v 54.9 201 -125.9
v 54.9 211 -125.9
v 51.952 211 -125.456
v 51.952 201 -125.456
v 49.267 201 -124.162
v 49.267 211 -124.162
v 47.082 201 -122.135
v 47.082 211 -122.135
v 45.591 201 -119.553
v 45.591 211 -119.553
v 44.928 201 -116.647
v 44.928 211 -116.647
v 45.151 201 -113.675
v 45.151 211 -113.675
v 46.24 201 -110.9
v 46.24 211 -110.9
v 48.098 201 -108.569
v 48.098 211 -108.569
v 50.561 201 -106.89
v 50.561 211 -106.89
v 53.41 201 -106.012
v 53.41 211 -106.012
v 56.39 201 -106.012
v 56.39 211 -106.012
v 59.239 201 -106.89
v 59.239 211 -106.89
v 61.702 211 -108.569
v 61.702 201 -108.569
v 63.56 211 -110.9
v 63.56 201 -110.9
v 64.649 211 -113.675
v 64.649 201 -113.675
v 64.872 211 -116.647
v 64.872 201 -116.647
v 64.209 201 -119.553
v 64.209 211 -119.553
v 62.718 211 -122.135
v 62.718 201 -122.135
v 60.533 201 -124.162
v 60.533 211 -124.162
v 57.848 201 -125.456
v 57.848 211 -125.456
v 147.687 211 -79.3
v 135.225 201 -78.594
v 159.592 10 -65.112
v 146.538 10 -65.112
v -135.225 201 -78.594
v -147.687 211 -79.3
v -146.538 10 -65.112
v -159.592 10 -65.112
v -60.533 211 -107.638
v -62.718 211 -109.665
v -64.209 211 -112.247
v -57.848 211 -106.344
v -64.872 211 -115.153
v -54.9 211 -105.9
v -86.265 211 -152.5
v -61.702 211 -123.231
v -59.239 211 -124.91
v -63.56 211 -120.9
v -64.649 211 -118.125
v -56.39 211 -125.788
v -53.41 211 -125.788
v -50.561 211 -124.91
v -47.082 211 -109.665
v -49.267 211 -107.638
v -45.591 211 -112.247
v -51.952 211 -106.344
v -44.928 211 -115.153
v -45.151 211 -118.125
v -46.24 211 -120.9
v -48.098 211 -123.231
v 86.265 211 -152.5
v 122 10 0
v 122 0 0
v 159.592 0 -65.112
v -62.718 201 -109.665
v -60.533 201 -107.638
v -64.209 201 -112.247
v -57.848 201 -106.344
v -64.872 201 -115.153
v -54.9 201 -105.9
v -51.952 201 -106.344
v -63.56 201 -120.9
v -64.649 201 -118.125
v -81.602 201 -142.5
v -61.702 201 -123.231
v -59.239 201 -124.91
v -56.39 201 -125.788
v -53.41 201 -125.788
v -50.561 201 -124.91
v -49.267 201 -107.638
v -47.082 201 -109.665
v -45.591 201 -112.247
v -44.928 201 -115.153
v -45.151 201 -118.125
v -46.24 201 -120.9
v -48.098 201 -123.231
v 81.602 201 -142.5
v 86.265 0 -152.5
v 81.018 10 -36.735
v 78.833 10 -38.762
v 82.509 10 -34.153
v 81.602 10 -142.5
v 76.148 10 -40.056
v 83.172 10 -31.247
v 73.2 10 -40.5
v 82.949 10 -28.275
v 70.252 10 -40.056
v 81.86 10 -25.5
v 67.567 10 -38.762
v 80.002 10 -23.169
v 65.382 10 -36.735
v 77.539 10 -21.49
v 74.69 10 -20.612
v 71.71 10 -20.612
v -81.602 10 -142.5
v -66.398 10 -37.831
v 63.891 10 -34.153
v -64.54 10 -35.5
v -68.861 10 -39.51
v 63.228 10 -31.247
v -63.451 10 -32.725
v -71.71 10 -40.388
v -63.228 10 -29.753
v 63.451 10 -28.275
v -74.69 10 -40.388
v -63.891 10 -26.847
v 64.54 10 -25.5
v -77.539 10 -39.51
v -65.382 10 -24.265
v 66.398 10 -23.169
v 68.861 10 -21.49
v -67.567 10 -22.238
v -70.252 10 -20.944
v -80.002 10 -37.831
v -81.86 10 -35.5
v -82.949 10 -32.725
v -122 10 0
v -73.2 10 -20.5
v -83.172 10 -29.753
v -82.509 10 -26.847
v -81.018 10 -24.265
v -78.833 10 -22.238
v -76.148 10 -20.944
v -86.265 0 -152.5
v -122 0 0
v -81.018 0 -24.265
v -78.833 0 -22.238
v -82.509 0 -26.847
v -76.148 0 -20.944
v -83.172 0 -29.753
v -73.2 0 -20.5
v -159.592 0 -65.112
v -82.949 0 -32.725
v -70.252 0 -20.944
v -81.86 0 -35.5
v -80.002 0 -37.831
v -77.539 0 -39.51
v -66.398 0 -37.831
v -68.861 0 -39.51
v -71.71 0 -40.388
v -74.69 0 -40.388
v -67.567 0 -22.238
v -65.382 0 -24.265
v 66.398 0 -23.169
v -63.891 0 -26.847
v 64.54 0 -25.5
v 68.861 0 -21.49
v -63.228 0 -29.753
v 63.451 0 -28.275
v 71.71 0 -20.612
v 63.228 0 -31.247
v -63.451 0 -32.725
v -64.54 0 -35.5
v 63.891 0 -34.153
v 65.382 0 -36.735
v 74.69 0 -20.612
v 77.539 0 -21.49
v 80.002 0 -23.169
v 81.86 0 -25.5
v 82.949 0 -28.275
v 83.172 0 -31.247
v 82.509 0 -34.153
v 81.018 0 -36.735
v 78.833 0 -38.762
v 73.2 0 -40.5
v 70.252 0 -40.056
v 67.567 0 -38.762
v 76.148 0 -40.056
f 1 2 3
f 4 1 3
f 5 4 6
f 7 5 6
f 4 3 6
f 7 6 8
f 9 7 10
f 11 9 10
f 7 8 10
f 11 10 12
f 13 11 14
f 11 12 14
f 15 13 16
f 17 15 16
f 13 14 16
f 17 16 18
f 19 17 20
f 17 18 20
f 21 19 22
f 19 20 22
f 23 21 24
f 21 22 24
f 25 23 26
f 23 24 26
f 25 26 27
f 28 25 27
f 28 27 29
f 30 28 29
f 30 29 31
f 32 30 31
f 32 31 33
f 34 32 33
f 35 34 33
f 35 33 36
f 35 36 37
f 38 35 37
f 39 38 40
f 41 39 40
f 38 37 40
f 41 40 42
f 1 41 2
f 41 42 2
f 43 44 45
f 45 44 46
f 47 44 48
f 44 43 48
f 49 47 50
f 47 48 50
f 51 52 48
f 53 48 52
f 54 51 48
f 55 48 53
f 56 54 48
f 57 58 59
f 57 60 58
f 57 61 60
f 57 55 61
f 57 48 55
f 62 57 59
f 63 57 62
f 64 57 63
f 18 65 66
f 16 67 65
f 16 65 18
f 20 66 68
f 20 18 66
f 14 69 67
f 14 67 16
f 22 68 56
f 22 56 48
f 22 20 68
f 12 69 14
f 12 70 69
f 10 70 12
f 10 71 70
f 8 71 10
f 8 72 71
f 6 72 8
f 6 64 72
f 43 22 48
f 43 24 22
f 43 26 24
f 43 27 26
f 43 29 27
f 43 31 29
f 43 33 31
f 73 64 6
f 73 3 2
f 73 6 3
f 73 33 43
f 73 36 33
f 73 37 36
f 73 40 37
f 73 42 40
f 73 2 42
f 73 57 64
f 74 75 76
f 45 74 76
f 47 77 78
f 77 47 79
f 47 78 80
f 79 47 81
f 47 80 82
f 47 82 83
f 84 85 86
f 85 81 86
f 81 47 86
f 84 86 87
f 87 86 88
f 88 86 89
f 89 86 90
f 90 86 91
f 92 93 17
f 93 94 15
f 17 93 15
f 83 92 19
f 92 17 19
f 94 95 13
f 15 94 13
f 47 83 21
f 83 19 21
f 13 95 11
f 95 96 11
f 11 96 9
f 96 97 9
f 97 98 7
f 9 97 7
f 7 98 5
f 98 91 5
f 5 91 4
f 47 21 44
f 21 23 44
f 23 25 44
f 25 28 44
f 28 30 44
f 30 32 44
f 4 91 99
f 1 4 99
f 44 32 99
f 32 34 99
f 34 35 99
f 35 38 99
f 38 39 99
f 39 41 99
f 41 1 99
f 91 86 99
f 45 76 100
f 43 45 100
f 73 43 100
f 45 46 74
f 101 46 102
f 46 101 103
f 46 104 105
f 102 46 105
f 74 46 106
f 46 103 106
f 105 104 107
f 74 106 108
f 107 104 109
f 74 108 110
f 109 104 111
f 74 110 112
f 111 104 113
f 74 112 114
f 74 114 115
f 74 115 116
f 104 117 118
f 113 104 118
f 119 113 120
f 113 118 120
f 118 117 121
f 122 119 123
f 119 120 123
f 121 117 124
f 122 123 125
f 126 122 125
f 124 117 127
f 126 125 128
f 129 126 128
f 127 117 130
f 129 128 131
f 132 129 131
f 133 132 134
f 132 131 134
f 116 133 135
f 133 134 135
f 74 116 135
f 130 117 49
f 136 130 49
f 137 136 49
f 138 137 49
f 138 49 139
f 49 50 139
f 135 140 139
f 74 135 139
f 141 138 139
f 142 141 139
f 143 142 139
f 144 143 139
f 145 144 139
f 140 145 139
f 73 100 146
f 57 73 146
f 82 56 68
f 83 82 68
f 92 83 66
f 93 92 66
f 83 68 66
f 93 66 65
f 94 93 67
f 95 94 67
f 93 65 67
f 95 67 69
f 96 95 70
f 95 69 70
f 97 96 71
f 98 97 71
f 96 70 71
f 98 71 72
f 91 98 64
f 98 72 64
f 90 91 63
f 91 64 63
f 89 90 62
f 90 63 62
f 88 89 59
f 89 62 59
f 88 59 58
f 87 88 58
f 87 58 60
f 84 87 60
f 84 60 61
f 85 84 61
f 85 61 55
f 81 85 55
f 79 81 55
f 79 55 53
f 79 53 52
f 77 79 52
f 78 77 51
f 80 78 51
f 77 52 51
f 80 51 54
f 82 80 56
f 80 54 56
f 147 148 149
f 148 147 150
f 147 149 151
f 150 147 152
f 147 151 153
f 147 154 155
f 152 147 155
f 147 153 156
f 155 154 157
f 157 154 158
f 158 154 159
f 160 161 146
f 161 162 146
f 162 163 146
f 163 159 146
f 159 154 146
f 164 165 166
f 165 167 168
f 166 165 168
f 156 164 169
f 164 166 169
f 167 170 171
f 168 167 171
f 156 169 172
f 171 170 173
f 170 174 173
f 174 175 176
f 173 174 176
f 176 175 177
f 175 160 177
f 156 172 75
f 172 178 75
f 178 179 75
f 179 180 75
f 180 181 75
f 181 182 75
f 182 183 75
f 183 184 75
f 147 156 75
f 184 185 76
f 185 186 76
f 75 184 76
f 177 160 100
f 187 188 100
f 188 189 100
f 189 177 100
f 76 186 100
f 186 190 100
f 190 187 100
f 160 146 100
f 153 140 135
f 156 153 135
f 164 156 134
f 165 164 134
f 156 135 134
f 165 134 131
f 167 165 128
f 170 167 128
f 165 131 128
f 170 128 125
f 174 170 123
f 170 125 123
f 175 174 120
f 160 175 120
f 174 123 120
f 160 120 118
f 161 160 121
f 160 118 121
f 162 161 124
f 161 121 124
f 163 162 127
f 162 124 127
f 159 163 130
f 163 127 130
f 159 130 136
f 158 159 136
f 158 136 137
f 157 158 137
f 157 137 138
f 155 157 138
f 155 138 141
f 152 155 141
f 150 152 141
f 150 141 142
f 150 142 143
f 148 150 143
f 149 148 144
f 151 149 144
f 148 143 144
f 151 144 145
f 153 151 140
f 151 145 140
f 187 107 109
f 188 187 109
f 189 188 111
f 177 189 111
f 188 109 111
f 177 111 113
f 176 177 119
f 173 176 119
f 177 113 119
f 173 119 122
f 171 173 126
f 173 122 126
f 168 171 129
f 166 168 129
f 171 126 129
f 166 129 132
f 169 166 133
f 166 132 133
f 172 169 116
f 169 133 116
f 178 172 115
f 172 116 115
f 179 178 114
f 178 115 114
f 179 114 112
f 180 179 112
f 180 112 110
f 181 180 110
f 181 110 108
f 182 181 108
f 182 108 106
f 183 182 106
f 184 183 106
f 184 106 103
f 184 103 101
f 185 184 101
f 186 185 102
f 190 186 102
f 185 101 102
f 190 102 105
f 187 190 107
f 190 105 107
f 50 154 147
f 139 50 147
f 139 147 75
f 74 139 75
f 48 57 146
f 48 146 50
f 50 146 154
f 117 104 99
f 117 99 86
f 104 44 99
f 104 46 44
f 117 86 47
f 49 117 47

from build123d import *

# Parameters (mm, degrees)
EXTRUDE_1_DEPTH          = 211
SHELL_2_T                = 10
CUT_EXTRUDE_2_DEPTH      = 306.363666708
CUT_EXTRUDE_2_DEPTH_BACK = 306.363666708
SKETCH_8_R               = 10
CUT_EXTRUDE_6_DEPTH      = 10
SKETCH_13_R              = 10
CUT_EXTRUDE_7_DEPTH      = 10


with BuildPart() as part:
    # 草图1 → 凸台-拉伸1 (new body)
    with BuildSketch(Plane(origin=(0, 0, 0), x_dir=(1, 0, 0), z_dir=(0, 1, 0))):
        Polygon((0, 152.5), (0, 0), (122, 0), (159.592352403, 65.111864338), (86.265, 152.5), align=None)
        Polygon((-122, 0), (0, 0), (0, 152.5), (-86.265, 152.5), (-159.592352403, 65.111864338), align=None)
    extrude(amount=EXTRUDE_1_DEPTH)

    # 抽壳2 (no face opened: a closed hollow body)
    add(offset(amount=-SHELL_2_T, mode=Mode.PRIVATE), mode=Mode.SUBTRACT)

    # 草图5 → 切除-拉伸-薄壁2 (cut, two sides)
    with BuildSketch(Plane(origin=(0, 0, 0), x_dir=(0, 0, -1), z_dir=(1, 0, 0))) as cut_extrude_2_sk:
        Polygon((79.3, 211), (65.111864338, 10), (0, 10), (0, 211), (10, 211), (10, 20), (55.792859546, 20), (69.32482043, 211.704125378), align=None)
    extrude(amount=CUT_EXTRUDE_2_DEPTH, mode=Mode.SUBTRACT)
    extrude(cut_extrude_2_sk.sketch, amount=-CUT_EXTRUDE_2_DEPTH_BACK, mode=Mode.SUBTRACT)


with BuildPart() as cut_extrude_2_kept_piece:
    # of the separate pieces the step leaves, the one the design keeps (cut_extrude_2_pieces_kept)
    add(part.part.solids().sort_by_distance((122, 0, 0))[0])

    # 草图8 → 切除-拉伸6 (cut)
    with BuildSketch(Plane(origin=(0, 211, 0), x_dir=(1, 0, 0), z_dir=(0, 1, 0))):
        with Locations(Location((-54.9, 115.9, 0), (0, 0, 270))):
            Circle(SKETCH_8_R)
        with Locations(Location((54.9, 115.9, 0), (0, 0, 90))):
            Circle(SKETCH_8_R)
    extrude(amount=-CUT_EXTRUDE_6_DEPTH, mode=Mode.SUBTRACT)

    # 草图13 → 切除-拉伸7 (cut)
    with BuildSketch(Plane(origin=(0, 10, 0), x_dir=(1, 0, 0), z_dir=(0, 1, 0))):
        with Locations(Location((-73.2, 30.5, 0), (0, 0, 270))):
            Circle(SKETCH_13_R)
        with Locations(Location((73.2, 30.5, 0), (0, 0, 90))):
            Circle(SKETCH_13_R)
    extrude(amount=-CUT_EXTRUDE_7_DEPTH, mode=Mode.SUBTRACT)


solid = cut_extrude_2_kept_piece.part
